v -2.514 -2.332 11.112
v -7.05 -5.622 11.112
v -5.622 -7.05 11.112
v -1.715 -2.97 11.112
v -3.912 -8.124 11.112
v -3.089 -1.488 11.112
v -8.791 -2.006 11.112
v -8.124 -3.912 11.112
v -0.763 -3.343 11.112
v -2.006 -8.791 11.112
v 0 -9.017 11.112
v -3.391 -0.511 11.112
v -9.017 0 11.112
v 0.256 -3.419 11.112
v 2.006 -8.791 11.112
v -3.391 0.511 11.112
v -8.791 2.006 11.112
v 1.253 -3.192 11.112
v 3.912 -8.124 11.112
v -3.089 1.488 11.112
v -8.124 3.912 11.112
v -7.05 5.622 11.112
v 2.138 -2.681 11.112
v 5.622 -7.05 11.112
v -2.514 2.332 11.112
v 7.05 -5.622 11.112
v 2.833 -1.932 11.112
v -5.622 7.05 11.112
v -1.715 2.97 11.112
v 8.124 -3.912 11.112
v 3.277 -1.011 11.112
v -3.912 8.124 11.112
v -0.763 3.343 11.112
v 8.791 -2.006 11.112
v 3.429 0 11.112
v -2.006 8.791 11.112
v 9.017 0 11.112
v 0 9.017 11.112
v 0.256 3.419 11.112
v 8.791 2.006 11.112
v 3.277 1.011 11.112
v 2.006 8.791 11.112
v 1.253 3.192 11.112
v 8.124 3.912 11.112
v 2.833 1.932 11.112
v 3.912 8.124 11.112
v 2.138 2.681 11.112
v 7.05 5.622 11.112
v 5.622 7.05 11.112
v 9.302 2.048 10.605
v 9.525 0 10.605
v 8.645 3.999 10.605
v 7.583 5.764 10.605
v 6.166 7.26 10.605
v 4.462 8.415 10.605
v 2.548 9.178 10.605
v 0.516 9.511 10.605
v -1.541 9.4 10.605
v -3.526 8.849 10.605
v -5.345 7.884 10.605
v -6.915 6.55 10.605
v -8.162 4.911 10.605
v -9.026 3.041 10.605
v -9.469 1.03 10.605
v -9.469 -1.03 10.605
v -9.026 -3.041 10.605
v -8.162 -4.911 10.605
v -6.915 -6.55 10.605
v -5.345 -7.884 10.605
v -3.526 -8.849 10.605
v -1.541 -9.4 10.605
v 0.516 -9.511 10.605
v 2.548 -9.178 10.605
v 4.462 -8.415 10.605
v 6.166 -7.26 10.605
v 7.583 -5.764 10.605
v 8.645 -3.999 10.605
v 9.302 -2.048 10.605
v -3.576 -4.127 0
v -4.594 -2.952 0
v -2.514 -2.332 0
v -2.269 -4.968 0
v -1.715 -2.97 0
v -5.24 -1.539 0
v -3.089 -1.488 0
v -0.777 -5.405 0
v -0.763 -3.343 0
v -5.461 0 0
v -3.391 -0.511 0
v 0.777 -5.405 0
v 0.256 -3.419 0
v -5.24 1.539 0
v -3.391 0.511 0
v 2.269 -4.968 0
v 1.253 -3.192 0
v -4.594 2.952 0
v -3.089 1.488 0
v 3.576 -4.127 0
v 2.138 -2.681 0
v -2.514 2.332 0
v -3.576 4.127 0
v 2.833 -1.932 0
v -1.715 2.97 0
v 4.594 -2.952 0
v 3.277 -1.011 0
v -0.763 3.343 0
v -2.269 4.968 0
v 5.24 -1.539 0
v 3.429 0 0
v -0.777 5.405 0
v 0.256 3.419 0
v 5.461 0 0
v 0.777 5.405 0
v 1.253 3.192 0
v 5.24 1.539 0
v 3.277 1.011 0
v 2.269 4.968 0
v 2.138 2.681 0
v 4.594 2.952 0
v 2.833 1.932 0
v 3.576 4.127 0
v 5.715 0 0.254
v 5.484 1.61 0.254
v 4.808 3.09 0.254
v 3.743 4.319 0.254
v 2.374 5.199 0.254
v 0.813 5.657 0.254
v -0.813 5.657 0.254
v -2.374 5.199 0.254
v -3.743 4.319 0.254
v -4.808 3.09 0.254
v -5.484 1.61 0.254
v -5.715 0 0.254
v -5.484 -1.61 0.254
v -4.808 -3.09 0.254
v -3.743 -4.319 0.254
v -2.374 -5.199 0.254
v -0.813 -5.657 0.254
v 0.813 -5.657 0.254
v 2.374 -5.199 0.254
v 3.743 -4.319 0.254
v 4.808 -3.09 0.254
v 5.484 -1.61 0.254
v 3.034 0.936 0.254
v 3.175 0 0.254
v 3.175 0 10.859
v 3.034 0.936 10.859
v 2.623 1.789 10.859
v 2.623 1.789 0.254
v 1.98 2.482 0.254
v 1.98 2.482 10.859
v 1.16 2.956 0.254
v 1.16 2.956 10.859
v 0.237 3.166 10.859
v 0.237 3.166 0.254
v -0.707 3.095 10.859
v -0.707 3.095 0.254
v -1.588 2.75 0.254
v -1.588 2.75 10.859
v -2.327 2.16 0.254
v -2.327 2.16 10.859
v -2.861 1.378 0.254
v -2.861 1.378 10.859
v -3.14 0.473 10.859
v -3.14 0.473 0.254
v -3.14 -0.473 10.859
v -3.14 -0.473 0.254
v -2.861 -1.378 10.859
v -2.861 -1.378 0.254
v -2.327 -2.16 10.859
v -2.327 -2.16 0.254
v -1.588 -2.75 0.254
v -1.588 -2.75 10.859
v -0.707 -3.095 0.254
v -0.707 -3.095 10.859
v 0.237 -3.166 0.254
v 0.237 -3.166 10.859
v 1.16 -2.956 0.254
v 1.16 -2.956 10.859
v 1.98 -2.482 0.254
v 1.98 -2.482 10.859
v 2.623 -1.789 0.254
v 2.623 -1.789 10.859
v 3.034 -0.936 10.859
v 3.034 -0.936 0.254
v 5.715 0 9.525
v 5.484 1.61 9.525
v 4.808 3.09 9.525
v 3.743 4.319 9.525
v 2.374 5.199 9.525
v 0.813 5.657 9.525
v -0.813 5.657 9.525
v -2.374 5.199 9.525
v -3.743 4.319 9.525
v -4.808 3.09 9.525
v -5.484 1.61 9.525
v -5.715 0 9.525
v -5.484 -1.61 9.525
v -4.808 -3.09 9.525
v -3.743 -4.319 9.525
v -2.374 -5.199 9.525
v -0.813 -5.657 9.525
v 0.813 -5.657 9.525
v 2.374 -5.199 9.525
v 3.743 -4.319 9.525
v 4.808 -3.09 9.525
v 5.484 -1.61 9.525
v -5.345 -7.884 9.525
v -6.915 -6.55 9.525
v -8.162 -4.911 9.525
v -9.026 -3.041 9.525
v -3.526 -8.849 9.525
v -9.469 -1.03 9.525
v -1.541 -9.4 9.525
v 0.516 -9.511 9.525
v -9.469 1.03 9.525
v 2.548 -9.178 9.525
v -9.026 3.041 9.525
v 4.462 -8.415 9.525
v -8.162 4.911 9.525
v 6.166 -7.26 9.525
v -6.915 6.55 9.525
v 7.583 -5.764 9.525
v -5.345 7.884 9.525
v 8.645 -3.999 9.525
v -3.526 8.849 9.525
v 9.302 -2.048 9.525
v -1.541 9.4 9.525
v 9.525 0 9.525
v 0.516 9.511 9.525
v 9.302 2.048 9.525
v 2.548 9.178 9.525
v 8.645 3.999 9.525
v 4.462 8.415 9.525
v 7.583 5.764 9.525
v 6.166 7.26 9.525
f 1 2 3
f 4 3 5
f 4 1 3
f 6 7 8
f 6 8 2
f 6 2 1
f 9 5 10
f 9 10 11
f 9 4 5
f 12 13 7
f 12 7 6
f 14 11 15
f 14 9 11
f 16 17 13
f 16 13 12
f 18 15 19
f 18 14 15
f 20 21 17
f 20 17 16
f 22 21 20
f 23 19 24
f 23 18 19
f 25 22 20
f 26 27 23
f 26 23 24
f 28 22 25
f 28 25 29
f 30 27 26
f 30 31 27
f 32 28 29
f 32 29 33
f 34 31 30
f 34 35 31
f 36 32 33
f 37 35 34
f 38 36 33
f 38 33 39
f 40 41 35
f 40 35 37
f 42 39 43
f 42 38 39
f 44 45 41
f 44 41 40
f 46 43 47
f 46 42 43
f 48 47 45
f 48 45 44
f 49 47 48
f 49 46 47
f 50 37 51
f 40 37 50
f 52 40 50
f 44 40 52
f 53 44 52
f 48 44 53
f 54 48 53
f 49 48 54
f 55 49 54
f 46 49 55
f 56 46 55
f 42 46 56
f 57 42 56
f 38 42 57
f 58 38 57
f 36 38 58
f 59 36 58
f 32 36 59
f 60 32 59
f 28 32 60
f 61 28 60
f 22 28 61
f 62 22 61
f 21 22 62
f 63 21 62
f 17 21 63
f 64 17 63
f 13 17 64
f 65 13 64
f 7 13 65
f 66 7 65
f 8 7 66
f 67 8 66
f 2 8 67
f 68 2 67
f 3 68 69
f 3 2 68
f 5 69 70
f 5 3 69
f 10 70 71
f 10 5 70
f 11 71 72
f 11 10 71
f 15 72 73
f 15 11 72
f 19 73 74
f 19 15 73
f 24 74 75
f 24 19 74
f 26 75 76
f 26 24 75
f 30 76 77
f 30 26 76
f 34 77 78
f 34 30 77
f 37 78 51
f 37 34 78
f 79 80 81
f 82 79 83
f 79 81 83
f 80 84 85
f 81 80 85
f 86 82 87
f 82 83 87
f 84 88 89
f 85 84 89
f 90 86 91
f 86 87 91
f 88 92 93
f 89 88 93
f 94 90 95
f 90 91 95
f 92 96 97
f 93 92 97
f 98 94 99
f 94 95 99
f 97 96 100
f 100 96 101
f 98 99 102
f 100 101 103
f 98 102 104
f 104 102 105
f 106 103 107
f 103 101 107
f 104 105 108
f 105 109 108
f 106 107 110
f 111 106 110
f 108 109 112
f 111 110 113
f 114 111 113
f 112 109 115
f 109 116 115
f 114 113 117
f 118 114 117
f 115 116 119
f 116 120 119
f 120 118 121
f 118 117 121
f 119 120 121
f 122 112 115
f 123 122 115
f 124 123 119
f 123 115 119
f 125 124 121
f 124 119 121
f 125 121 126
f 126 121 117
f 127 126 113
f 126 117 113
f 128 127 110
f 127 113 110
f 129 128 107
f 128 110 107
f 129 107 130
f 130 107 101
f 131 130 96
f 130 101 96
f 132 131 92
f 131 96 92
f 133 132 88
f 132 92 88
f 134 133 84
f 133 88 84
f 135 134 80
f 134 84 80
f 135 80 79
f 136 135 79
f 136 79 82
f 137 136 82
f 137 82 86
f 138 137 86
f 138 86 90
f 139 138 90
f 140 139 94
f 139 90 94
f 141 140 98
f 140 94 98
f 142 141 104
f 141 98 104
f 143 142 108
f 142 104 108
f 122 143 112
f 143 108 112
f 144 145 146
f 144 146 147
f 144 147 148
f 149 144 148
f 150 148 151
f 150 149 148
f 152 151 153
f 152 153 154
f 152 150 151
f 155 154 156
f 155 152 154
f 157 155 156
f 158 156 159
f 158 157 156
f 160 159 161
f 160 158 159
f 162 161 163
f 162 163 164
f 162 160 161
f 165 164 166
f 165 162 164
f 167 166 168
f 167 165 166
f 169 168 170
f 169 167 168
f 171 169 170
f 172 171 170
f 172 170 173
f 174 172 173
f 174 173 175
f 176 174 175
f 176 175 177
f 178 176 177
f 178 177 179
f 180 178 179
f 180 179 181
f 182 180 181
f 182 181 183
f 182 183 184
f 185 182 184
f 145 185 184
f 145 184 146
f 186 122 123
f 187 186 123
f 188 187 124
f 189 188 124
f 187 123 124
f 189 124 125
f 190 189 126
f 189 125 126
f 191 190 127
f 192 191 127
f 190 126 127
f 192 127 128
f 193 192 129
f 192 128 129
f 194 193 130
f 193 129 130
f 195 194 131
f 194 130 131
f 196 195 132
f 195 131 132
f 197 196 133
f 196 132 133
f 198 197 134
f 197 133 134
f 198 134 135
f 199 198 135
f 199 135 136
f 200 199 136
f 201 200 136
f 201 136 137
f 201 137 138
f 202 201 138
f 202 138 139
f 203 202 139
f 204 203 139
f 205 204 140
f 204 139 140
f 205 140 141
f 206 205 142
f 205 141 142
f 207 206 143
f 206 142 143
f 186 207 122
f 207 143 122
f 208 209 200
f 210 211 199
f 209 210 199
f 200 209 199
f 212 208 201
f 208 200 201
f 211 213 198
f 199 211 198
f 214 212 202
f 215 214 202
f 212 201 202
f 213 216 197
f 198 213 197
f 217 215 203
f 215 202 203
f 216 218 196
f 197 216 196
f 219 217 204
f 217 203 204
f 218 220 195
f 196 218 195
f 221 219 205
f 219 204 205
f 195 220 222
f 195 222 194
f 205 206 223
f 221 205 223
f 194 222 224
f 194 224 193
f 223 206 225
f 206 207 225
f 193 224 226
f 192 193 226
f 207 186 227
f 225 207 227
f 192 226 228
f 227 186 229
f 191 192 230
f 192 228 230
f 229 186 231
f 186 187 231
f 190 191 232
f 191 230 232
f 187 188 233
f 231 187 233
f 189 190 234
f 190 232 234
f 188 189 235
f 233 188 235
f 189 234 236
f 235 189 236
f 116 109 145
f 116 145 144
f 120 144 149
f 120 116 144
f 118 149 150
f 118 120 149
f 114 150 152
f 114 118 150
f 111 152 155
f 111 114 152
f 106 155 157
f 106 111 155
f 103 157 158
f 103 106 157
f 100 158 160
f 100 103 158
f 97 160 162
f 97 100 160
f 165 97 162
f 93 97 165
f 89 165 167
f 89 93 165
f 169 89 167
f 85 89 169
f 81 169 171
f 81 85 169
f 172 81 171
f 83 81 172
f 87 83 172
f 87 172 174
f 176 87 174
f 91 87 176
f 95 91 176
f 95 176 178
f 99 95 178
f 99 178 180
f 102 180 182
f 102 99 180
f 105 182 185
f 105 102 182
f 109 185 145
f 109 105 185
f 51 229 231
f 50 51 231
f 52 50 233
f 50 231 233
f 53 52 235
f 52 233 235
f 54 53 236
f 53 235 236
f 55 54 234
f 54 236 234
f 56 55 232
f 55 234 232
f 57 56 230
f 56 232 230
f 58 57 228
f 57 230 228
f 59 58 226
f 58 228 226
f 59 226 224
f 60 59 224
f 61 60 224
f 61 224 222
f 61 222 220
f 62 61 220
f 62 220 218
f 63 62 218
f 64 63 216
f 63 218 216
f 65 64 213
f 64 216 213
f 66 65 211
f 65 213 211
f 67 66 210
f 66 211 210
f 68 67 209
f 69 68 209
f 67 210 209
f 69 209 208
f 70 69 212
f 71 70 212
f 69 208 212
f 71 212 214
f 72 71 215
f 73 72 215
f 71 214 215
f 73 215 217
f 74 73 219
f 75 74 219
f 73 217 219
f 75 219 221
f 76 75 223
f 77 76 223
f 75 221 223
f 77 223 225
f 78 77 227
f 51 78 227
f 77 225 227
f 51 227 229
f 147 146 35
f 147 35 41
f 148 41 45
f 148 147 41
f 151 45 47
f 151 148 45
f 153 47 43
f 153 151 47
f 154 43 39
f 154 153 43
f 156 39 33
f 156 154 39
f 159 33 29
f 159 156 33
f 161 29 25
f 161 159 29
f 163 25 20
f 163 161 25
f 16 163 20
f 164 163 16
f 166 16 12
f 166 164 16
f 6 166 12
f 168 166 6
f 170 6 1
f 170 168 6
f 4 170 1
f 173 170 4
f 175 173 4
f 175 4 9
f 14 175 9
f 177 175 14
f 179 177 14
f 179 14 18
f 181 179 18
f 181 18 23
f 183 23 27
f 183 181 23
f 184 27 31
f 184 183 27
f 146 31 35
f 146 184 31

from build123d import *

# Parameters (mm, degrees)
F0_R     = 5.715
F0_R_2   = 3.175
F1_DEPTH = 9.525
F2_R     = 9.525
F2_R_2   = 5.715
F2_R_3   = 3.175
F3_DEPTH = 1.5875
F4_SIZE  = 0.508
F5_SIZE  = 0.254


with BuildPart() as f1:
    # F0 (on Top) → F1 (new body)
    with BuildSketch(Plane.XY):
        Circle(F0_R)
        Circle(F0_R_2, mode=Mode.SUBTRACT)
    extrude(amount=F1_DEPTH)

    # F2 (on face) → F3 (join)
    with BuildSketch(Plane.XY.offset(9.525)):
        Circle(F2_R)
        Circle(F2_R_2, mode=Mode.SUBTRACT)
        Circle(F2_R_2)
        Circle(F2_R_3, mode=Mode.SUBTRACT)
    extrude(amount=F3_DEPTH)

    # F4
    f4_edges = [f1.edges().sort_by_distance(p)[0] for p in [
        (-9.525, 0, 11.1125),
    ]]
    chamfer(f4_edges, length=F4_SIZE)

    # F5
    f5_edges = [f1.edges().sort_by_distance(p)[0] for p in [
        (-3.175, 0, 11.1125),
        (-5.715, 0, 0),
        (-3.175, 0, 0),
    ]]
    chamfer(f5_edges, length=F5_SIZE)


solid = f1.part
